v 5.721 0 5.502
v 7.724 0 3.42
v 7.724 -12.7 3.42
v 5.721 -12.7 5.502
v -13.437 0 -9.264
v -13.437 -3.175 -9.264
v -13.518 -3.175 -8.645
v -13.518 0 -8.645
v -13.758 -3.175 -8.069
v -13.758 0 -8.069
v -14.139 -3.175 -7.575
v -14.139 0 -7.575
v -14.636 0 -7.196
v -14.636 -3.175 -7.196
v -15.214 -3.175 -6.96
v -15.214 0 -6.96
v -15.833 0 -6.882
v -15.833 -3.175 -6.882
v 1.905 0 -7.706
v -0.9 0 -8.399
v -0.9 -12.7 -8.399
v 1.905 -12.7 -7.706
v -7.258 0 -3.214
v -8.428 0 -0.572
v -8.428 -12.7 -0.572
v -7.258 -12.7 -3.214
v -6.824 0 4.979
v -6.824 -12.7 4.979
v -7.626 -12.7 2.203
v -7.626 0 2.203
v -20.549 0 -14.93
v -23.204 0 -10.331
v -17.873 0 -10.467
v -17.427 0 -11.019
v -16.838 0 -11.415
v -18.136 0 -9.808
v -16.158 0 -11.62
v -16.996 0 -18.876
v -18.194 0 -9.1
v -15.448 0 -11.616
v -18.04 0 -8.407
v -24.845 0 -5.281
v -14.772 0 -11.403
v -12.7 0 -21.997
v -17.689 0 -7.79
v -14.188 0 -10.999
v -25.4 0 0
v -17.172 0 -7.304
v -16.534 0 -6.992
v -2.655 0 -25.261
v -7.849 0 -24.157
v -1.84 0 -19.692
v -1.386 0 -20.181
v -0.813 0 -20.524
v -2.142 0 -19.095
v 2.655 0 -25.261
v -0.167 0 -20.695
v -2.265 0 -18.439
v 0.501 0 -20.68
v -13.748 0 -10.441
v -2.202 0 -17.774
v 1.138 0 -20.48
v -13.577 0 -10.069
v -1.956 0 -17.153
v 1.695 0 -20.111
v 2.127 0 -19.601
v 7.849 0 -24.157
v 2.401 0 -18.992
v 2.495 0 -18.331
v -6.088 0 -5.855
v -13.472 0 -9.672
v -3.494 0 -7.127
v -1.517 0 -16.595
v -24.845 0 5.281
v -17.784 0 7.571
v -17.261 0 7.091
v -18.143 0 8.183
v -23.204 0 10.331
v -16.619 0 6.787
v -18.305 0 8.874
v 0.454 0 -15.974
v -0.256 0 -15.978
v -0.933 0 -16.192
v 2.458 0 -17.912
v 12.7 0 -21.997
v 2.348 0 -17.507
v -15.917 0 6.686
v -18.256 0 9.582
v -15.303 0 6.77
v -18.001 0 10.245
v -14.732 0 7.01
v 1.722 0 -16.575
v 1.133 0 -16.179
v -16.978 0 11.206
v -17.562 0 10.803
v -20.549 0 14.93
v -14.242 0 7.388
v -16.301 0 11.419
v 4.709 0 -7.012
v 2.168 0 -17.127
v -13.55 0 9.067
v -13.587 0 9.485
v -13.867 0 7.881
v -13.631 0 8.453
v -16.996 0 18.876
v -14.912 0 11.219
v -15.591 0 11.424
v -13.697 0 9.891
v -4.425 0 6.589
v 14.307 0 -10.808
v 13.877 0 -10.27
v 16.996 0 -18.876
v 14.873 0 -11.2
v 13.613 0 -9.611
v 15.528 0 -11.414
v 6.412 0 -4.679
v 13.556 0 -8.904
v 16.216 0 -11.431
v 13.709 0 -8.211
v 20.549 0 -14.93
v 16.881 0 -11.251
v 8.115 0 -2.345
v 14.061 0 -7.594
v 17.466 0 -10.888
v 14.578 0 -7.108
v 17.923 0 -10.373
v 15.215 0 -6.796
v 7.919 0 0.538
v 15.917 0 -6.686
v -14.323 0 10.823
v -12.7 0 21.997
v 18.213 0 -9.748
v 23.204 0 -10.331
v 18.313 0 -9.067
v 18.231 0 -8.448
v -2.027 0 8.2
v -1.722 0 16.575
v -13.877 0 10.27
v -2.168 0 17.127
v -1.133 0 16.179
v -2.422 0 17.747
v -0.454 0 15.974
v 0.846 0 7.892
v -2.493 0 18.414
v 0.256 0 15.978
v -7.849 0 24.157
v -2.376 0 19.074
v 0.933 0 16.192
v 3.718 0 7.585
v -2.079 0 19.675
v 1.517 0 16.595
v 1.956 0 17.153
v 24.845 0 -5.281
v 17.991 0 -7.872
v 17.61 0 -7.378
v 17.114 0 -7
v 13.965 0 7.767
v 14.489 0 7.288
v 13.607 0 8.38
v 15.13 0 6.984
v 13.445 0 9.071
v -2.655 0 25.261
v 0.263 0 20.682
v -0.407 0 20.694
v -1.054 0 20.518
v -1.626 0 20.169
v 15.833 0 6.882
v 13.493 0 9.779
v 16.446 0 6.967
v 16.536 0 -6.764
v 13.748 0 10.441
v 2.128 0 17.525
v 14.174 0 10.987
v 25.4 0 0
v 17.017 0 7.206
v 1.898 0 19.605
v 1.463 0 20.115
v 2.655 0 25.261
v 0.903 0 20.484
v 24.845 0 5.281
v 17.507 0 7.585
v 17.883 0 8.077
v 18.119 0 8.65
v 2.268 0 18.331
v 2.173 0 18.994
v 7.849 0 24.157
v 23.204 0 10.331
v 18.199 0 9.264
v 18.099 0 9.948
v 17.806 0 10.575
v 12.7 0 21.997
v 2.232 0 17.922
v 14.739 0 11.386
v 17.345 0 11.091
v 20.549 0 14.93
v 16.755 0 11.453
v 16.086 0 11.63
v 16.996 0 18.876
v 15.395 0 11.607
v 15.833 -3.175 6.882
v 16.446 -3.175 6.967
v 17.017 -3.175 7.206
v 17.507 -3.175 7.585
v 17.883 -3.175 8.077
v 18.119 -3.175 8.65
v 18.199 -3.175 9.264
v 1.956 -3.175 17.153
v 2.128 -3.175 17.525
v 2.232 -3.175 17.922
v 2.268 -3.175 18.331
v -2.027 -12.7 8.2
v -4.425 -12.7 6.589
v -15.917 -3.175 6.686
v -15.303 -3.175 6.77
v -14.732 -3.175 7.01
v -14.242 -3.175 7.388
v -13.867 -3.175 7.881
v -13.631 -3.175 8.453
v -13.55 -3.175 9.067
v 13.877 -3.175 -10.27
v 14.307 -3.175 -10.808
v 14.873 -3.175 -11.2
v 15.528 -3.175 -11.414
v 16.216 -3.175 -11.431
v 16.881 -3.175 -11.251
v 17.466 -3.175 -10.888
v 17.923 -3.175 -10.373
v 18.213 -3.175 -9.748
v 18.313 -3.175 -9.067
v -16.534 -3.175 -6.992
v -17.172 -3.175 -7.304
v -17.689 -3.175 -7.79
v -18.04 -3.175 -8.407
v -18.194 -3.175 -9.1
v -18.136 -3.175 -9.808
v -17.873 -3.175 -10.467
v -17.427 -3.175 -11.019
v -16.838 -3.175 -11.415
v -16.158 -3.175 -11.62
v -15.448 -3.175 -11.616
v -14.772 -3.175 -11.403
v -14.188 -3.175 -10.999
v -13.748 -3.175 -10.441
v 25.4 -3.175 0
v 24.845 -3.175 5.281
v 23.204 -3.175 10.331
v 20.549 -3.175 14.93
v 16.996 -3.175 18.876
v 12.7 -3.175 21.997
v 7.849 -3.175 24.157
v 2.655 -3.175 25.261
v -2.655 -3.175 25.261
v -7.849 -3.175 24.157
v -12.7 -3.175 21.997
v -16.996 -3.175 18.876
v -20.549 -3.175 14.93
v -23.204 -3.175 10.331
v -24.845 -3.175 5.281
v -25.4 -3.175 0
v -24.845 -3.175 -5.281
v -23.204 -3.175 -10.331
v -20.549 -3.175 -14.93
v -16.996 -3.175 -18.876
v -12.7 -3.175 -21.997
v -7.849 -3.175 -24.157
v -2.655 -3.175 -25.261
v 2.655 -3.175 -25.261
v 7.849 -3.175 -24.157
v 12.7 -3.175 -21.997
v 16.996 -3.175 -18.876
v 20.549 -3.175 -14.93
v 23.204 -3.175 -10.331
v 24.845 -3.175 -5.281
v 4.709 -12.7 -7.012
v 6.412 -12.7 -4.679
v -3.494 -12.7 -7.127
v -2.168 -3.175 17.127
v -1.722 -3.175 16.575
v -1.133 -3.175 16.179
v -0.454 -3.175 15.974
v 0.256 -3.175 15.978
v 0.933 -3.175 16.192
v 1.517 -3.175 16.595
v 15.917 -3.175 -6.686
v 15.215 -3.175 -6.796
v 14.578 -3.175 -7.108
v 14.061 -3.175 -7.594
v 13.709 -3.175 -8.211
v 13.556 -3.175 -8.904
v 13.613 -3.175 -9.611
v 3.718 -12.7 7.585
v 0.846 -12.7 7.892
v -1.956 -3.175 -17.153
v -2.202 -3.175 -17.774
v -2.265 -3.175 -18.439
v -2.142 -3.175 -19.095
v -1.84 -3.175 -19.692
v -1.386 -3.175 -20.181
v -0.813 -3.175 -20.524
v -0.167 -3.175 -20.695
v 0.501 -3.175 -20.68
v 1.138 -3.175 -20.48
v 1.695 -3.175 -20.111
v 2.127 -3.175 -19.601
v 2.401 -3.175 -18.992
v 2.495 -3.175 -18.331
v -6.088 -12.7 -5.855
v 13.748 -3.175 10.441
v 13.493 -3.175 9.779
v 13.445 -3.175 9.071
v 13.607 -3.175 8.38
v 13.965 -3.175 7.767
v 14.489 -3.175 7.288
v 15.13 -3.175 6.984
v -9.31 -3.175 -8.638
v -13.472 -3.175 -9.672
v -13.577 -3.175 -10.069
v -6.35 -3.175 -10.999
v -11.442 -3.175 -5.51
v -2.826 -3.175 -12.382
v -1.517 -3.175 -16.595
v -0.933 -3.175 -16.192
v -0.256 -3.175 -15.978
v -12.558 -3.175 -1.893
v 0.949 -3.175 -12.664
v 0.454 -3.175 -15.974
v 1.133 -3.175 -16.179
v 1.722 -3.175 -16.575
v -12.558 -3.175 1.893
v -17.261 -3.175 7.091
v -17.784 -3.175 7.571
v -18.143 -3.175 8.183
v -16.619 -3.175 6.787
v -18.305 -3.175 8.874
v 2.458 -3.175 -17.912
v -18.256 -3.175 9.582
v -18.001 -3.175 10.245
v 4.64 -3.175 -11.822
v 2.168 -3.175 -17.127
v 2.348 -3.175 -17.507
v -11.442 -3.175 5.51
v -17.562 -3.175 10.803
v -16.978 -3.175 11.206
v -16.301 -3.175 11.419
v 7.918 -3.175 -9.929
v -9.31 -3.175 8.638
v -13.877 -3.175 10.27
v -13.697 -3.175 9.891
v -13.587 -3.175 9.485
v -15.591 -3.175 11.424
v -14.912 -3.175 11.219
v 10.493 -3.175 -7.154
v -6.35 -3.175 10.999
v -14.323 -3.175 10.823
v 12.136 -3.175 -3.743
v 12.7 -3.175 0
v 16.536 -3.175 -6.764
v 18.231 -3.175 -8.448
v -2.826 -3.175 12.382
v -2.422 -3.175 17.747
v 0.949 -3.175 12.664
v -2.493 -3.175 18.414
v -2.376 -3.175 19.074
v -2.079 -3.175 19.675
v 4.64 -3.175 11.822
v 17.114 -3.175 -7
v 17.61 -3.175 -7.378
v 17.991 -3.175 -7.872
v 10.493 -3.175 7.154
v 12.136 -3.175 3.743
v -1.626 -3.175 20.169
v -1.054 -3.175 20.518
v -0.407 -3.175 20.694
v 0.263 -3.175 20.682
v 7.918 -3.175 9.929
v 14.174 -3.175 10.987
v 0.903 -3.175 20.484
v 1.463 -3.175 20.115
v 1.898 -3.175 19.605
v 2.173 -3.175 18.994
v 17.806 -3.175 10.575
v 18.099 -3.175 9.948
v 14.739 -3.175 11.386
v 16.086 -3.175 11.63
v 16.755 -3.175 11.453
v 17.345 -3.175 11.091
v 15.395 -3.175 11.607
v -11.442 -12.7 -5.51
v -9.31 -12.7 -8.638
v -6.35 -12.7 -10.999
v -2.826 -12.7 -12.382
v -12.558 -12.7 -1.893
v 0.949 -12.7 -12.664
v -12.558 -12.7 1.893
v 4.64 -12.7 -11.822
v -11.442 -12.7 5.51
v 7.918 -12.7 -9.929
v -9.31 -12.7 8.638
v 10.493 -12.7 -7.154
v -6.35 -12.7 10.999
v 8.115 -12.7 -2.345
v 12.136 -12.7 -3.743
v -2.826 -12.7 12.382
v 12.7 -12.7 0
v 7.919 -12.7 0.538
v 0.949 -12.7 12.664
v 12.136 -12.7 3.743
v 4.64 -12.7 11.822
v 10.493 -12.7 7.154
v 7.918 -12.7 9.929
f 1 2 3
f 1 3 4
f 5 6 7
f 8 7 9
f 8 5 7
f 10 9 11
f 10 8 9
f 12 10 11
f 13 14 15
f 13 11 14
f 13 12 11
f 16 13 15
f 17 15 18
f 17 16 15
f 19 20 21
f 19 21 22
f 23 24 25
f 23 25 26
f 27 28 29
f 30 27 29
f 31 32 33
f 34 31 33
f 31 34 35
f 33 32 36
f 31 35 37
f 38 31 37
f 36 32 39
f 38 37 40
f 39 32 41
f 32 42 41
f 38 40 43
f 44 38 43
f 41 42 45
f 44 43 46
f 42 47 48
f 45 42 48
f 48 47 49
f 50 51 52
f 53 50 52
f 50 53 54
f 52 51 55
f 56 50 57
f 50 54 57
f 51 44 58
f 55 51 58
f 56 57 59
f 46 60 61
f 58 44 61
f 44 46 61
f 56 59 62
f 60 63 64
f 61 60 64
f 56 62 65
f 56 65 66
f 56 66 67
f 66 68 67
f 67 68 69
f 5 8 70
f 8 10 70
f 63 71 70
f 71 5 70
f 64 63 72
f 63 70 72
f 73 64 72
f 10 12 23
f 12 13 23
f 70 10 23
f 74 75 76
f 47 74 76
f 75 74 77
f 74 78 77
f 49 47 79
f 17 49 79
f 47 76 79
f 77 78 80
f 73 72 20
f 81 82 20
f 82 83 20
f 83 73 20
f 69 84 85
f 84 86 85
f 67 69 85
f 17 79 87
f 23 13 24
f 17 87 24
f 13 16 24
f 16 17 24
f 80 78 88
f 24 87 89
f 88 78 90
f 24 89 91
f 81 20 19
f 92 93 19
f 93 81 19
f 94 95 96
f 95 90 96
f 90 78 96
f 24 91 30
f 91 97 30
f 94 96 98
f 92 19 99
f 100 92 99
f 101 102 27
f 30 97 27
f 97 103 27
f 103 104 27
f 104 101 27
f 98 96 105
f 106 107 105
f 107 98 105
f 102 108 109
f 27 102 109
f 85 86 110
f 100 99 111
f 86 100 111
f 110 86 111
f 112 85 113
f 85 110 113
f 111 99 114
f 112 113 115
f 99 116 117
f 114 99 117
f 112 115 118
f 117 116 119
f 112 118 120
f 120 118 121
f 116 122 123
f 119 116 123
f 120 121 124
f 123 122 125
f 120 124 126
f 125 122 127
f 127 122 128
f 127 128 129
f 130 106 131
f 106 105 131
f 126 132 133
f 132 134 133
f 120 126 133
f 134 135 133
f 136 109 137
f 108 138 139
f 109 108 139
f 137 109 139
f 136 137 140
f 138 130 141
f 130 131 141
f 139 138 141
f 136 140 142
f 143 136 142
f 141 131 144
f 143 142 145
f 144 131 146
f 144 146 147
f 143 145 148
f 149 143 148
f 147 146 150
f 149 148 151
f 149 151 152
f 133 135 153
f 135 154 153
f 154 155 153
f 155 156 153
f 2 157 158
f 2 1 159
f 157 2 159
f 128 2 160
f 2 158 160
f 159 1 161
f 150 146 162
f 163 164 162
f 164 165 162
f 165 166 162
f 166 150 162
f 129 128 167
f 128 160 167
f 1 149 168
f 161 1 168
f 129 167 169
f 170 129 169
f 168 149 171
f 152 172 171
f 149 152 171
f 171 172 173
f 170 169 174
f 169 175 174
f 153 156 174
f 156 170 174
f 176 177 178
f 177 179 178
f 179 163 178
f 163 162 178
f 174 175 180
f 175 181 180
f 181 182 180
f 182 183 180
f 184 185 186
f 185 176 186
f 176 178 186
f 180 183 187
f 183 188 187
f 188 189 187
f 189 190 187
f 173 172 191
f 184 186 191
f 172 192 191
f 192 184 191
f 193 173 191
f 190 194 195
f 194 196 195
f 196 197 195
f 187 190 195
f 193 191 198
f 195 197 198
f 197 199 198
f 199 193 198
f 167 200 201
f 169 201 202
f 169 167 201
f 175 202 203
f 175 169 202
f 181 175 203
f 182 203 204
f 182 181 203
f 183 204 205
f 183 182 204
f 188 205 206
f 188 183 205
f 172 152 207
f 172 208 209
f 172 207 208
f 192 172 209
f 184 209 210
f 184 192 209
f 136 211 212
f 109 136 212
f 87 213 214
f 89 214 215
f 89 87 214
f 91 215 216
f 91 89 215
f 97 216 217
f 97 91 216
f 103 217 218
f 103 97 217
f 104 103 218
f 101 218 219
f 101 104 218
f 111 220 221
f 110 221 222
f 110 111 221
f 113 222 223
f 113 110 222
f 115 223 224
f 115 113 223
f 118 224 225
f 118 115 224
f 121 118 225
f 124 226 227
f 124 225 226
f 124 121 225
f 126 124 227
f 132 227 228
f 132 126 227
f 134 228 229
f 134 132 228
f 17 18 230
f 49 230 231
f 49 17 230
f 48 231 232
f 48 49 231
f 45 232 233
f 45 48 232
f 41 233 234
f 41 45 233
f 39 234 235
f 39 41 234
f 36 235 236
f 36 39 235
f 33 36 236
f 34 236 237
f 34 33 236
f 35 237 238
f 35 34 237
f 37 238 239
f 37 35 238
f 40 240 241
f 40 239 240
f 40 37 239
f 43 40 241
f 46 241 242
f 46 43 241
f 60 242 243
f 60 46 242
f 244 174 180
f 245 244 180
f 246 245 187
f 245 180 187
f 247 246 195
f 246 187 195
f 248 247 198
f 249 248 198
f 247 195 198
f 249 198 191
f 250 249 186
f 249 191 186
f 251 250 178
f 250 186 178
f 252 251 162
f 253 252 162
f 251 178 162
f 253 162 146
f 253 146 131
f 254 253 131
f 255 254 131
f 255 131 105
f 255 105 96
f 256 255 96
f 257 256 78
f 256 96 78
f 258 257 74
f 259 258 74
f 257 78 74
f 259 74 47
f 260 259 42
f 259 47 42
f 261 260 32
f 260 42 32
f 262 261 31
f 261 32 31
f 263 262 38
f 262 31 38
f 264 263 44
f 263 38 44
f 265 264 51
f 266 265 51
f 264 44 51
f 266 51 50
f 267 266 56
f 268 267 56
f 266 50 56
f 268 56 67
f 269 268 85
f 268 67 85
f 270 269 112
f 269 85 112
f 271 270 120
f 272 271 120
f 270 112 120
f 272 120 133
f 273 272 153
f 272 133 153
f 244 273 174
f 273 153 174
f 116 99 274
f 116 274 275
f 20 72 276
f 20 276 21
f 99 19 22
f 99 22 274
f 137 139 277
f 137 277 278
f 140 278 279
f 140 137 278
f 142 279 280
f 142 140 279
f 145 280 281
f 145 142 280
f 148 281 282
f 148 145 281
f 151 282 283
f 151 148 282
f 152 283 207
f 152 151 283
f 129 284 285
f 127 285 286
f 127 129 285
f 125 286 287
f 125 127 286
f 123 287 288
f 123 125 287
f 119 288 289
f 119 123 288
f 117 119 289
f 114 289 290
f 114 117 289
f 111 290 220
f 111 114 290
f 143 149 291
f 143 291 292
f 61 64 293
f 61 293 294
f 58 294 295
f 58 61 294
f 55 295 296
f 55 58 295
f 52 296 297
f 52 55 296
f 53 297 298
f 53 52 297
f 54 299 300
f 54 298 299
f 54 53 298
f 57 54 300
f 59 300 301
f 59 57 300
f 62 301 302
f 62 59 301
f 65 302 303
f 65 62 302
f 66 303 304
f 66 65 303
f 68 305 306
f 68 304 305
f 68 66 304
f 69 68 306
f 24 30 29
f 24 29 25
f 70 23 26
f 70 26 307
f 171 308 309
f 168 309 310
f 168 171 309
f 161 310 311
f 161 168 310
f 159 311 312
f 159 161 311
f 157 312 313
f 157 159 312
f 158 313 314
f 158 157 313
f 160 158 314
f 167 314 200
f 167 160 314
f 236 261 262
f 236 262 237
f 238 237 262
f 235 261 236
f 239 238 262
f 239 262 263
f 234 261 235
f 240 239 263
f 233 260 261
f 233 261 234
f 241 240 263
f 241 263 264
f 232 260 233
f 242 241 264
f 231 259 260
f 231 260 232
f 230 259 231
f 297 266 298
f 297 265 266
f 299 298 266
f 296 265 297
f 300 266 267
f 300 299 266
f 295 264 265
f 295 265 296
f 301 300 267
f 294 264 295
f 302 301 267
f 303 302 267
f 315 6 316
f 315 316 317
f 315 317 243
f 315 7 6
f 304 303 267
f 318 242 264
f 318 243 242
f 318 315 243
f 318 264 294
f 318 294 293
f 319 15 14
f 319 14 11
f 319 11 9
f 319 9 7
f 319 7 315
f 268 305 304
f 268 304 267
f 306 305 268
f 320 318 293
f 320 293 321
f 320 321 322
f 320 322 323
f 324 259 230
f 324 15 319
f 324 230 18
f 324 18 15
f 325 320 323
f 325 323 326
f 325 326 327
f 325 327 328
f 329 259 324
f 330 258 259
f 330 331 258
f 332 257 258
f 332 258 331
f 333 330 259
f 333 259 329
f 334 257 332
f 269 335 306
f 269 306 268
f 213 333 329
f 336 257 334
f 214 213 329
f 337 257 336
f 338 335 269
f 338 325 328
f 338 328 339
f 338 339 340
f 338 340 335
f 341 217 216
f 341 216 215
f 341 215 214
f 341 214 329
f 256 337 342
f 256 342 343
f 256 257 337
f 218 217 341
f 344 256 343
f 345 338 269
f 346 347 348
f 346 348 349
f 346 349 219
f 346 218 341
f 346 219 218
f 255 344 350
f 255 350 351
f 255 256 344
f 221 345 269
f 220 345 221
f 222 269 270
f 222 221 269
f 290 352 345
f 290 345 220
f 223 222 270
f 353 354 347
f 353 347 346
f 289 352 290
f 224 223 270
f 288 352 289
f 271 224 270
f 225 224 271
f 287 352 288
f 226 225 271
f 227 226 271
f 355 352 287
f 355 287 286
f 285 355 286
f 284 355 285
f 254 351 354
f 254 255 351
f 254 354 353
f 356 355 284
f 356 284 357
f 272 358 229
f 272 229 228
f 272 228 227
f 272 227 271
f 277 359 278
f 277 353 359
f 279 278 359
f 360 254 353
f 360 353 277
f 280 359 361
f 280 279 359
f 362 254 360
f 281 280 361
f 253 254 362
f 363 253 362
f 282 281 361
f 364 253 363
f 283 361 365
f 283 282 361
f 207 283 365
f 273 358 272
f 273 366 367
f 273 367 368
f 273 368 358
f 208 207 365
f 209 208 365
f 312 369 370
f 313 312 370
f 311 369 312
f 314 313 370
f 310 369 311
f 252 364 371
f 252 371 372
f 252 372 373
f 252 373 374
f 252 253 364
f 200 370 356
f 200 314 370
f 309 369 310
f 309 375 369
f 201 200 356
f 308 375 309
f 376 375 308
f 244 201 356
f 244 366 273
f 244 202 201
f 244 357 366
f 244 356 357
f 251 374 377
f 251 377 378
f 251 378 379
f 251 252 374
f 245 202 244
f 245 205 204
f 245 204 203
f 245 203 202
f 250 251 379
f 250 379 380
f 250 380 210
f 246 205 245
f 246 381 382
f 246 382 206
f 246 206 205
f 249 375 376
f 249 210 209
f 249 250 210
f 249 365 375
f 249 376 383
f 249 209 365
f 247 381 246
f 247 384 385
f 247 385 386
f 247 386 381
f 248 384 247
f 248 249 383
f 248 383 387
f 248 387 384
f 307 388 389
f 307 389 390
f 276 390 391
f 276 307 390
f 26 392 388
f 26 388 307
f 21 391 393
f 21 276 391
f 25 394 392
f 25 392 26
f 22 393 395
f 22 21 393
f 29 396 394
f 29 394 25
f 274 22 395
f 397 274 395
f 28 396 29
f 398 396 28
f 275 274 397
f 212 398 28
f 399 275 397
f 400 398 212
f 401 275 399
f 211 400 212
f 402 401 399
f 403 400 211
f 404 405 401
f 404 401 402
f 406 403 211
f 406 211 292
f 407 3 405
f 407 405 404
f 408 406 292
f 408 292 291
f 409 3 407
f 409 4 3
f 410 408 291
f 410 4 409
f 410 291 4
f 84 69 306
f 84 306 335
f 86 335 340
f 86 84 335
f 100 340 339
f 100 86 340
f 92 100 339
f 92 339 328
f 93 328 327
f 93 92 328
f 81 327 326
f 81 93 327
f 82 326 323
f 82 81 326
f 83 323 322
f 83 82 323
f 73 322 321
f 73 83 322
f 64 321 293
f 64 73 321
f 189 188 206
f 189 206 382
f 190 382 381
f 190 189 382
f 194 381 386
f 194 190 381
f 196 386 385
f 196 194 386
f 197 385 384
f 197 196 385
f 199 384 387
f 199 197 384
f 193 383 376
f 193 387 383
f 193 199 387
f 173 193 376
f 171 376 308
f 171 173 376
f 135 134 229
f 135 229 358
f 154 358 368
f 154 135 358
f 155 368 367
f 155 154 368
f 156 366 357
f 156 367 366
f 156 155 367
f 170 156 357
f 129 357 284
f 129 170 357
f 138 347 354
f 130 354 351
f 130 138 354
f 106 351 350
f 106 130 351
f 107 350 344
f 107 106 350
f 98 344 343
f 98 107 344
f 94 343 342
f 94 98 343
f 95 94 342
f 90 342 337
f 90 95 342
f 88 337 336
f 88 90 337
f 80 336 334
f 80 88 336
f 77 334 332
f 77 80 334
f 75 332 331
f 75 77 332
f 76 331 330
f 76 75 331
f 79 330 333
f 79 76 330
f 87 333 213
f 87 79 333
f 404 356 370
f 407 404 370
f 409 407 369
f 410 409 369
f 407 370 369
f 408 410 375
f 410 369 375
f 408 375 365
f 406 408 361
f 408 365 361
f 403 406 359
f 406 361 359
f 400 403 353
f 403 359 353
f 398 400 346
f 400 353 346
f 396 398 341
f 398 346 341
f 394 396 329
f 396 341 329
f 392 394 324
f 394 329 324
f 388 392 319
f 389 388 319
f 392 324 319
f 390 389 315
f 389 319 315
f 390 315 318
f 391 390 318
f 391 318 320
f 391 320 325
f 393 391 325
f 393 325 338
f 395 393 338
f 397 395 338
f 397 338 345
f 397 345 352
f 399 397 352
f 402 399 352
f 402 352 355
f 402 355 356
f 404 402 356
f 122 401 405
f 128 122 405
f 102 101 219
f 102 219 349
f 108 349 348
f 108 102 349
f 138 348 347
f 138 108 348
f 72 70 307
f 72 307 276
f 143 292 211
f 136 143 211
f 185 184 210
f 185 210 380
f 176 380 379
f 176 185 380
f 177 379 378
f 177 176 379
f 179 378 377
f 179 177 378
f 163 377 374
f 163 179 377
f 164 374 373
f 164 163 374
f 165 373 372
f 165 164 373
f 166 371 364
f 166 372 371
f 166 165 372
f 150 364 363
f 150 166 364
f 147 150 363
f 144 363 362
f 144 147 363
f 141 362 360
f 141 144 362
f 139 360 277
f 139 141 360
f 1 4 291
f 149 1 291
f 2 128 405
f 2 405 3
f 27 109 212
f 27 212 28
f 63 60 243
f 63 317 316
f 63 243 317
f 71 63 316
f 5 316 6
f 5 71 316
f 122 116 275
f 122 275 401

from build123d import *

# Parameters (mm, degrees)
F0_R     = 25.4
F0_R_2   = 12.7
F1_DEPTH = 3.175
F2_R     = 12.7
F3_DEPTH = 12.7
F4_R     = 7.9375
F5_DEPTH = 76.2
F7_DEPTH = 25.4
F9_DEPTH = 50.8


with BuildPart() as f1:
    # F0 (on Front) → F1 (new body)
    with BuildSketch(Plane.XZ):
        Circle(F0_R)
        Circle(F0_R_2, mode=Mode.SUBTRACT)
    extrude(amount=F1_DEPTH)

    # F2 (on Front) → F3 (join)
    with BuildSketch(Plane.XZ):
        Circle(F2_R)
    extrude(amount=F3_DEPTH)

    # F4 (on Front) → F5 (cut)
    with BuildSketch(Plane.XZ):
        Circle(F4_R)
    extrude(amount=F5_DEPTH, mode=Mode.SUBTRACT)

    # F6 (on Front) → F7 (cut)
    with BuildSketch(Plane.XZ):
        with BuildLine():
            Line((-0.1134674759, 18.3305198635), (1.9560859375, 17.1526827645))
            ThreePointArc((1.9560859375, 17.1526827645), (2.1885398686, 17.7213288028), (2.2677825241, 18.3305198635))
            ThreePointArc((2.2677825241, 18.3305198635), (-0.7368962138, 20.6287122338), (-2.1682810318, 17.1271525825))
            Line((-2.1682810318, 17.1271525825), (-0.1134674759, 18.3305198635))
        make_face()
        with BuildLine():
            ThreePointArc((-2.1682810318, 17.1271525825), (-0.0987276184, 15.9493154835), (1.9560859375, 17.1526827645))
            Line((1.9560859375, 17.1526827645), (-0.1134674759, 18.3305198635))
            Line((-0.1134674759, 18.3305198635), (-2.1682810318, 17.1271525825))
        make_face()
        with BuildLine():
            Line((-15.9314296043, 9.0669942151), (-13.8766160484, 10.2703614961))
            ThreePointArc((-13.8766160484, 10.2703614961), (-18.0009830177, 10.2448313141), (-15.9166897468, 6.6857898352))
            Line((-15.9166897468, 6.6857898352), (-15.9314296043, 9.0669942151))
        make_face()
        with BuildLine():
            ThreePointArc((-13.5501796043, 9.0669942151), (-13.6332372339, 9.690422953), (-13.8766160484, 10.2703614961))
            Line((-13.8766160484, 10.2703614961), (-15.9314296043, 9.0669942151))
            Line((-15.9314296043, 9.0669942151), (-15.9166897468, 6.6857898352))
            ThreePointArc((-15.9166897468, 6.6857898352), (-14.2424282946, 7.3884156085), (-13.5501796043, 9.0669942151))
        make_face()
        with BuildLine():
            Line((15.8179621284, 9.2635256484), (15.8327019859, 6.8823212684))
            ThreePointArc((15.8327019859, 6.8823212684), (17.5069634381, 7.5849470418), (18.1992121284, 9.2635256484))
            ThreePointArc((18.1992121284, 9.2635256484), (16.4271531891, 11.5655329928), (13.748408715, 10.4413627473))
            Line((13.748408715, 10.4413627473), (15.8179621284, 9.2635256484))
        make_face()
        with BuildLine():
            ThreePointArc((13.748408715, 10.4413627473), (13.7631485725, 8.0601583673), (15.8327019859, 6.8823212684))
            Line((15.8327019859, 6.8823212684), (15.8179621284, 9.2635256484))
            Line((15.8179621284, 9.2635256484), (13.748408715, 10.4413627473))
        make_face()
        with BuildLine():
            ThreePointArc((18.3126796043, -9.0669942151), (17.6100082109, -7.3779929054), (15.9166897468, -6.6857898352))
            Line((15.9166897468, -6.6857898352), (15.9314296043, -9.0669942151))
            Line((15.9314296043, -9.0669942151), (13.8766160484, -10.2703614961))
            ThreePointArc((13.8766160484, -10.2703614961), (16.5548583422, -11.3651865855), (18.3126796043, -9.0669942151))
        make_face()
        with BuildLine():
            Line((15.9314296043, -9.0669942151), (15.9166897468, -6.6857898352))
            ThreePointArc((15.9166897468, -6.6857898352), (13.8618761909, -7.8891571162), (13.8766160484, -10.2703614961))
            Line((13.8766160484, -10.2703614961), (15.9314296043, -9.0669942151))
        make_face()
        with BuildLine():
            ThreePointArc((2.4947174759, -18.3305198635), (2.4116598463, -17.7070911256), (2.1682810318, -17.1271525825))
            Line((2.1682810318, -17.1271525825), (0.1134674759, -18.3305198635))
            Line((0.1134674759, -18.3305198635), (-1.9560859375, -17.1526827645))
            ThreePointArc((-1.9560859375, -17.1526827645), (-0.4957235848, -20.632527208), (2.4947174759, -18.3305198635))
        make_face()
        with BuildLine():
            Line((0.1134674759, -18.3305198635), (2.1682810318, -17.1271525825))
            ThreePointArc((2.1682810318, -17.1271525825), (0.0987276184, -15.9493154835), (-1.9560859375, -17.1526827645))
            Line((-1.9560859375, -17.1526827645), (0.1134674759, -18.3305198635))
        make_face()
        with BuildLine():
            ThreePointArc((-15.8327019859, -6.8823212684), (-17.8727756843, -10.4668929294), (-13.748408715, -10.4413627473))
            Line((-13.748408715, -10.4413627473), (-15.8179621284, -9.2635256484))
            Line((-15.8179621284, -9.2635256484), (-15.8327019859, -6.8823212684))
        make_face()
        with BuildLine():
            Line((-15.8179621284, -9.2635256484), (-13.748408715, -10.4413627473))
            ThreePointArc((-13.748408715, -10.4413627473), (-13.5159547839, -9.8727167091), (-13.4367121284, -9.2635256484))
            ThreePointArc((-13.4367121284, -9.2635256484), (-14.1393835218, -7.5745243387), (-15.8327019859, -6.8823212684))
            Line((-15.8327019859, -6.8823212684), (-15.8179621284, -9.2635256484))
        make_face()
    extrude(amount=F7_DEPTH, mode=Mode.SUBTRACT)

    # F8 (on Front) → F9 (cut)
    with BuildSketch(Plane.XZ):
        with BuildLine():
            ThreePointArc((-4.4252673903, 6.5894548162), (-1.9046648273, 7.7055926538), (0.8456684244, 7.8923222923))
            Line((0.8456684244, 7.8923222923), (-2.026901991, 8.2001204215))
            Line((-2.026901991, 8.2001204215), (-4.4252673903, 6.5894548162))
        make_face()
        with BuildLine():
            ThreePointArc((-7.62557139, 2.203308246), (-6.4121173773, 4.6785314992), (-4.4252673903, 6.5894548162))
            Line((-4.4252673903, 6.5894548162), (-6.8236328118, 4.9787891959))
            Line((-6.8236328118, 4.9787891959), (-7.62557139, 2.203308246))
        make_face()
        with BuildLine():
            ThreePointArc((0.8456684244, 7.8923222923), (3.4940015971, 7.1271213747), (5.7209066054, 5.5022844222))
            Line((5.7209066054, 5.5022844222), (3.7182387979, 7.5845241677))
            Line((3.7182387979, 7.5845241677), (0.8456684244, 7.8923222923))
        make_face()
        with BuildLine():
            ThreePointArc((5.7209066054, 5.5022844222), (7.2577858275, 3.2137907729), (7.919268966, 0.5376665262))
            Line((7.919268966, 0.5376665262), (7.7235743297, 3.4200447632))
            Line((7.7235743297, 3.4200447632), (5.7209066054, 5.5022844222))
        make_face()
        with BuildLine():
            Line((-0.8999415178, -8.3988339591), (1.9046660077, -7.705592362))
            ThreePointArc((1.9046660077, -7.705592362), (-0.8456678406, -7.8923223549), (-3.4940016205, -7.1271213632))
            Line((-3.4940016205, -7.1271213632), (-0.8999415178, -8.3988339591))
        make_face()
        with BuildLine():
            Line((4.7092712059, -7.0123513401), (6.4121173532, -4.6785315323))
            ThreePointArc((6.4121173532, -4.6785315323), (4.4252678659, -6.5894544968), (1.9046660077, -7.705592362))
            Line((1.9046660077, -7.705592362), (4.7092712059, -7.0123513401))
        make_face()
        with BuildLine():
            Line((-8.4275100038, -0.5721728275), (-7.2577857868, -3.2137908648))
            ThreePointArc((-7.2577857868, -3.2137908648), (-7.9192689629, -0.5376665725), (-7.62557139, 2.203308246))
            Line((-7.62557139, 2.203308246), (-8.4275100038, -0.5721728275))
        make_face()
        with BuildLine():
            Line((-6.0880616036, -5.855408826), (-3.4940016205, -7.1271213632))
            ThreePointArc((-3.4940016205, -7.1271213632), (-5.7209065724, -5.5022844564), (-7.2577857868, -3.2137908648))
            Line((-7.2577857868, -3.2137908648), (-6.0880616036, -5.855408826))
        make_face()
        with BuildLine():
            ThreePointArc((7.919268966, 0.5376665262), (7.9329409322, 0.2689877618), (7.9375, 0))
            ThreePointArc((7.9375, 0), (7.5465252846, -2.4604597903), (6.4121173532, -4.6785315323))
            Line((6.4121173532, -4.6785315323), (8.1149635946, -2.3447115955))
            Line((8.1149635946, -2.3447115955), (7.919268966, 0.5376665262))
        make_face()
    extrude(amount=F9_DEPTH, mode=Mode.SUBTRACT)


solid = f1.part
